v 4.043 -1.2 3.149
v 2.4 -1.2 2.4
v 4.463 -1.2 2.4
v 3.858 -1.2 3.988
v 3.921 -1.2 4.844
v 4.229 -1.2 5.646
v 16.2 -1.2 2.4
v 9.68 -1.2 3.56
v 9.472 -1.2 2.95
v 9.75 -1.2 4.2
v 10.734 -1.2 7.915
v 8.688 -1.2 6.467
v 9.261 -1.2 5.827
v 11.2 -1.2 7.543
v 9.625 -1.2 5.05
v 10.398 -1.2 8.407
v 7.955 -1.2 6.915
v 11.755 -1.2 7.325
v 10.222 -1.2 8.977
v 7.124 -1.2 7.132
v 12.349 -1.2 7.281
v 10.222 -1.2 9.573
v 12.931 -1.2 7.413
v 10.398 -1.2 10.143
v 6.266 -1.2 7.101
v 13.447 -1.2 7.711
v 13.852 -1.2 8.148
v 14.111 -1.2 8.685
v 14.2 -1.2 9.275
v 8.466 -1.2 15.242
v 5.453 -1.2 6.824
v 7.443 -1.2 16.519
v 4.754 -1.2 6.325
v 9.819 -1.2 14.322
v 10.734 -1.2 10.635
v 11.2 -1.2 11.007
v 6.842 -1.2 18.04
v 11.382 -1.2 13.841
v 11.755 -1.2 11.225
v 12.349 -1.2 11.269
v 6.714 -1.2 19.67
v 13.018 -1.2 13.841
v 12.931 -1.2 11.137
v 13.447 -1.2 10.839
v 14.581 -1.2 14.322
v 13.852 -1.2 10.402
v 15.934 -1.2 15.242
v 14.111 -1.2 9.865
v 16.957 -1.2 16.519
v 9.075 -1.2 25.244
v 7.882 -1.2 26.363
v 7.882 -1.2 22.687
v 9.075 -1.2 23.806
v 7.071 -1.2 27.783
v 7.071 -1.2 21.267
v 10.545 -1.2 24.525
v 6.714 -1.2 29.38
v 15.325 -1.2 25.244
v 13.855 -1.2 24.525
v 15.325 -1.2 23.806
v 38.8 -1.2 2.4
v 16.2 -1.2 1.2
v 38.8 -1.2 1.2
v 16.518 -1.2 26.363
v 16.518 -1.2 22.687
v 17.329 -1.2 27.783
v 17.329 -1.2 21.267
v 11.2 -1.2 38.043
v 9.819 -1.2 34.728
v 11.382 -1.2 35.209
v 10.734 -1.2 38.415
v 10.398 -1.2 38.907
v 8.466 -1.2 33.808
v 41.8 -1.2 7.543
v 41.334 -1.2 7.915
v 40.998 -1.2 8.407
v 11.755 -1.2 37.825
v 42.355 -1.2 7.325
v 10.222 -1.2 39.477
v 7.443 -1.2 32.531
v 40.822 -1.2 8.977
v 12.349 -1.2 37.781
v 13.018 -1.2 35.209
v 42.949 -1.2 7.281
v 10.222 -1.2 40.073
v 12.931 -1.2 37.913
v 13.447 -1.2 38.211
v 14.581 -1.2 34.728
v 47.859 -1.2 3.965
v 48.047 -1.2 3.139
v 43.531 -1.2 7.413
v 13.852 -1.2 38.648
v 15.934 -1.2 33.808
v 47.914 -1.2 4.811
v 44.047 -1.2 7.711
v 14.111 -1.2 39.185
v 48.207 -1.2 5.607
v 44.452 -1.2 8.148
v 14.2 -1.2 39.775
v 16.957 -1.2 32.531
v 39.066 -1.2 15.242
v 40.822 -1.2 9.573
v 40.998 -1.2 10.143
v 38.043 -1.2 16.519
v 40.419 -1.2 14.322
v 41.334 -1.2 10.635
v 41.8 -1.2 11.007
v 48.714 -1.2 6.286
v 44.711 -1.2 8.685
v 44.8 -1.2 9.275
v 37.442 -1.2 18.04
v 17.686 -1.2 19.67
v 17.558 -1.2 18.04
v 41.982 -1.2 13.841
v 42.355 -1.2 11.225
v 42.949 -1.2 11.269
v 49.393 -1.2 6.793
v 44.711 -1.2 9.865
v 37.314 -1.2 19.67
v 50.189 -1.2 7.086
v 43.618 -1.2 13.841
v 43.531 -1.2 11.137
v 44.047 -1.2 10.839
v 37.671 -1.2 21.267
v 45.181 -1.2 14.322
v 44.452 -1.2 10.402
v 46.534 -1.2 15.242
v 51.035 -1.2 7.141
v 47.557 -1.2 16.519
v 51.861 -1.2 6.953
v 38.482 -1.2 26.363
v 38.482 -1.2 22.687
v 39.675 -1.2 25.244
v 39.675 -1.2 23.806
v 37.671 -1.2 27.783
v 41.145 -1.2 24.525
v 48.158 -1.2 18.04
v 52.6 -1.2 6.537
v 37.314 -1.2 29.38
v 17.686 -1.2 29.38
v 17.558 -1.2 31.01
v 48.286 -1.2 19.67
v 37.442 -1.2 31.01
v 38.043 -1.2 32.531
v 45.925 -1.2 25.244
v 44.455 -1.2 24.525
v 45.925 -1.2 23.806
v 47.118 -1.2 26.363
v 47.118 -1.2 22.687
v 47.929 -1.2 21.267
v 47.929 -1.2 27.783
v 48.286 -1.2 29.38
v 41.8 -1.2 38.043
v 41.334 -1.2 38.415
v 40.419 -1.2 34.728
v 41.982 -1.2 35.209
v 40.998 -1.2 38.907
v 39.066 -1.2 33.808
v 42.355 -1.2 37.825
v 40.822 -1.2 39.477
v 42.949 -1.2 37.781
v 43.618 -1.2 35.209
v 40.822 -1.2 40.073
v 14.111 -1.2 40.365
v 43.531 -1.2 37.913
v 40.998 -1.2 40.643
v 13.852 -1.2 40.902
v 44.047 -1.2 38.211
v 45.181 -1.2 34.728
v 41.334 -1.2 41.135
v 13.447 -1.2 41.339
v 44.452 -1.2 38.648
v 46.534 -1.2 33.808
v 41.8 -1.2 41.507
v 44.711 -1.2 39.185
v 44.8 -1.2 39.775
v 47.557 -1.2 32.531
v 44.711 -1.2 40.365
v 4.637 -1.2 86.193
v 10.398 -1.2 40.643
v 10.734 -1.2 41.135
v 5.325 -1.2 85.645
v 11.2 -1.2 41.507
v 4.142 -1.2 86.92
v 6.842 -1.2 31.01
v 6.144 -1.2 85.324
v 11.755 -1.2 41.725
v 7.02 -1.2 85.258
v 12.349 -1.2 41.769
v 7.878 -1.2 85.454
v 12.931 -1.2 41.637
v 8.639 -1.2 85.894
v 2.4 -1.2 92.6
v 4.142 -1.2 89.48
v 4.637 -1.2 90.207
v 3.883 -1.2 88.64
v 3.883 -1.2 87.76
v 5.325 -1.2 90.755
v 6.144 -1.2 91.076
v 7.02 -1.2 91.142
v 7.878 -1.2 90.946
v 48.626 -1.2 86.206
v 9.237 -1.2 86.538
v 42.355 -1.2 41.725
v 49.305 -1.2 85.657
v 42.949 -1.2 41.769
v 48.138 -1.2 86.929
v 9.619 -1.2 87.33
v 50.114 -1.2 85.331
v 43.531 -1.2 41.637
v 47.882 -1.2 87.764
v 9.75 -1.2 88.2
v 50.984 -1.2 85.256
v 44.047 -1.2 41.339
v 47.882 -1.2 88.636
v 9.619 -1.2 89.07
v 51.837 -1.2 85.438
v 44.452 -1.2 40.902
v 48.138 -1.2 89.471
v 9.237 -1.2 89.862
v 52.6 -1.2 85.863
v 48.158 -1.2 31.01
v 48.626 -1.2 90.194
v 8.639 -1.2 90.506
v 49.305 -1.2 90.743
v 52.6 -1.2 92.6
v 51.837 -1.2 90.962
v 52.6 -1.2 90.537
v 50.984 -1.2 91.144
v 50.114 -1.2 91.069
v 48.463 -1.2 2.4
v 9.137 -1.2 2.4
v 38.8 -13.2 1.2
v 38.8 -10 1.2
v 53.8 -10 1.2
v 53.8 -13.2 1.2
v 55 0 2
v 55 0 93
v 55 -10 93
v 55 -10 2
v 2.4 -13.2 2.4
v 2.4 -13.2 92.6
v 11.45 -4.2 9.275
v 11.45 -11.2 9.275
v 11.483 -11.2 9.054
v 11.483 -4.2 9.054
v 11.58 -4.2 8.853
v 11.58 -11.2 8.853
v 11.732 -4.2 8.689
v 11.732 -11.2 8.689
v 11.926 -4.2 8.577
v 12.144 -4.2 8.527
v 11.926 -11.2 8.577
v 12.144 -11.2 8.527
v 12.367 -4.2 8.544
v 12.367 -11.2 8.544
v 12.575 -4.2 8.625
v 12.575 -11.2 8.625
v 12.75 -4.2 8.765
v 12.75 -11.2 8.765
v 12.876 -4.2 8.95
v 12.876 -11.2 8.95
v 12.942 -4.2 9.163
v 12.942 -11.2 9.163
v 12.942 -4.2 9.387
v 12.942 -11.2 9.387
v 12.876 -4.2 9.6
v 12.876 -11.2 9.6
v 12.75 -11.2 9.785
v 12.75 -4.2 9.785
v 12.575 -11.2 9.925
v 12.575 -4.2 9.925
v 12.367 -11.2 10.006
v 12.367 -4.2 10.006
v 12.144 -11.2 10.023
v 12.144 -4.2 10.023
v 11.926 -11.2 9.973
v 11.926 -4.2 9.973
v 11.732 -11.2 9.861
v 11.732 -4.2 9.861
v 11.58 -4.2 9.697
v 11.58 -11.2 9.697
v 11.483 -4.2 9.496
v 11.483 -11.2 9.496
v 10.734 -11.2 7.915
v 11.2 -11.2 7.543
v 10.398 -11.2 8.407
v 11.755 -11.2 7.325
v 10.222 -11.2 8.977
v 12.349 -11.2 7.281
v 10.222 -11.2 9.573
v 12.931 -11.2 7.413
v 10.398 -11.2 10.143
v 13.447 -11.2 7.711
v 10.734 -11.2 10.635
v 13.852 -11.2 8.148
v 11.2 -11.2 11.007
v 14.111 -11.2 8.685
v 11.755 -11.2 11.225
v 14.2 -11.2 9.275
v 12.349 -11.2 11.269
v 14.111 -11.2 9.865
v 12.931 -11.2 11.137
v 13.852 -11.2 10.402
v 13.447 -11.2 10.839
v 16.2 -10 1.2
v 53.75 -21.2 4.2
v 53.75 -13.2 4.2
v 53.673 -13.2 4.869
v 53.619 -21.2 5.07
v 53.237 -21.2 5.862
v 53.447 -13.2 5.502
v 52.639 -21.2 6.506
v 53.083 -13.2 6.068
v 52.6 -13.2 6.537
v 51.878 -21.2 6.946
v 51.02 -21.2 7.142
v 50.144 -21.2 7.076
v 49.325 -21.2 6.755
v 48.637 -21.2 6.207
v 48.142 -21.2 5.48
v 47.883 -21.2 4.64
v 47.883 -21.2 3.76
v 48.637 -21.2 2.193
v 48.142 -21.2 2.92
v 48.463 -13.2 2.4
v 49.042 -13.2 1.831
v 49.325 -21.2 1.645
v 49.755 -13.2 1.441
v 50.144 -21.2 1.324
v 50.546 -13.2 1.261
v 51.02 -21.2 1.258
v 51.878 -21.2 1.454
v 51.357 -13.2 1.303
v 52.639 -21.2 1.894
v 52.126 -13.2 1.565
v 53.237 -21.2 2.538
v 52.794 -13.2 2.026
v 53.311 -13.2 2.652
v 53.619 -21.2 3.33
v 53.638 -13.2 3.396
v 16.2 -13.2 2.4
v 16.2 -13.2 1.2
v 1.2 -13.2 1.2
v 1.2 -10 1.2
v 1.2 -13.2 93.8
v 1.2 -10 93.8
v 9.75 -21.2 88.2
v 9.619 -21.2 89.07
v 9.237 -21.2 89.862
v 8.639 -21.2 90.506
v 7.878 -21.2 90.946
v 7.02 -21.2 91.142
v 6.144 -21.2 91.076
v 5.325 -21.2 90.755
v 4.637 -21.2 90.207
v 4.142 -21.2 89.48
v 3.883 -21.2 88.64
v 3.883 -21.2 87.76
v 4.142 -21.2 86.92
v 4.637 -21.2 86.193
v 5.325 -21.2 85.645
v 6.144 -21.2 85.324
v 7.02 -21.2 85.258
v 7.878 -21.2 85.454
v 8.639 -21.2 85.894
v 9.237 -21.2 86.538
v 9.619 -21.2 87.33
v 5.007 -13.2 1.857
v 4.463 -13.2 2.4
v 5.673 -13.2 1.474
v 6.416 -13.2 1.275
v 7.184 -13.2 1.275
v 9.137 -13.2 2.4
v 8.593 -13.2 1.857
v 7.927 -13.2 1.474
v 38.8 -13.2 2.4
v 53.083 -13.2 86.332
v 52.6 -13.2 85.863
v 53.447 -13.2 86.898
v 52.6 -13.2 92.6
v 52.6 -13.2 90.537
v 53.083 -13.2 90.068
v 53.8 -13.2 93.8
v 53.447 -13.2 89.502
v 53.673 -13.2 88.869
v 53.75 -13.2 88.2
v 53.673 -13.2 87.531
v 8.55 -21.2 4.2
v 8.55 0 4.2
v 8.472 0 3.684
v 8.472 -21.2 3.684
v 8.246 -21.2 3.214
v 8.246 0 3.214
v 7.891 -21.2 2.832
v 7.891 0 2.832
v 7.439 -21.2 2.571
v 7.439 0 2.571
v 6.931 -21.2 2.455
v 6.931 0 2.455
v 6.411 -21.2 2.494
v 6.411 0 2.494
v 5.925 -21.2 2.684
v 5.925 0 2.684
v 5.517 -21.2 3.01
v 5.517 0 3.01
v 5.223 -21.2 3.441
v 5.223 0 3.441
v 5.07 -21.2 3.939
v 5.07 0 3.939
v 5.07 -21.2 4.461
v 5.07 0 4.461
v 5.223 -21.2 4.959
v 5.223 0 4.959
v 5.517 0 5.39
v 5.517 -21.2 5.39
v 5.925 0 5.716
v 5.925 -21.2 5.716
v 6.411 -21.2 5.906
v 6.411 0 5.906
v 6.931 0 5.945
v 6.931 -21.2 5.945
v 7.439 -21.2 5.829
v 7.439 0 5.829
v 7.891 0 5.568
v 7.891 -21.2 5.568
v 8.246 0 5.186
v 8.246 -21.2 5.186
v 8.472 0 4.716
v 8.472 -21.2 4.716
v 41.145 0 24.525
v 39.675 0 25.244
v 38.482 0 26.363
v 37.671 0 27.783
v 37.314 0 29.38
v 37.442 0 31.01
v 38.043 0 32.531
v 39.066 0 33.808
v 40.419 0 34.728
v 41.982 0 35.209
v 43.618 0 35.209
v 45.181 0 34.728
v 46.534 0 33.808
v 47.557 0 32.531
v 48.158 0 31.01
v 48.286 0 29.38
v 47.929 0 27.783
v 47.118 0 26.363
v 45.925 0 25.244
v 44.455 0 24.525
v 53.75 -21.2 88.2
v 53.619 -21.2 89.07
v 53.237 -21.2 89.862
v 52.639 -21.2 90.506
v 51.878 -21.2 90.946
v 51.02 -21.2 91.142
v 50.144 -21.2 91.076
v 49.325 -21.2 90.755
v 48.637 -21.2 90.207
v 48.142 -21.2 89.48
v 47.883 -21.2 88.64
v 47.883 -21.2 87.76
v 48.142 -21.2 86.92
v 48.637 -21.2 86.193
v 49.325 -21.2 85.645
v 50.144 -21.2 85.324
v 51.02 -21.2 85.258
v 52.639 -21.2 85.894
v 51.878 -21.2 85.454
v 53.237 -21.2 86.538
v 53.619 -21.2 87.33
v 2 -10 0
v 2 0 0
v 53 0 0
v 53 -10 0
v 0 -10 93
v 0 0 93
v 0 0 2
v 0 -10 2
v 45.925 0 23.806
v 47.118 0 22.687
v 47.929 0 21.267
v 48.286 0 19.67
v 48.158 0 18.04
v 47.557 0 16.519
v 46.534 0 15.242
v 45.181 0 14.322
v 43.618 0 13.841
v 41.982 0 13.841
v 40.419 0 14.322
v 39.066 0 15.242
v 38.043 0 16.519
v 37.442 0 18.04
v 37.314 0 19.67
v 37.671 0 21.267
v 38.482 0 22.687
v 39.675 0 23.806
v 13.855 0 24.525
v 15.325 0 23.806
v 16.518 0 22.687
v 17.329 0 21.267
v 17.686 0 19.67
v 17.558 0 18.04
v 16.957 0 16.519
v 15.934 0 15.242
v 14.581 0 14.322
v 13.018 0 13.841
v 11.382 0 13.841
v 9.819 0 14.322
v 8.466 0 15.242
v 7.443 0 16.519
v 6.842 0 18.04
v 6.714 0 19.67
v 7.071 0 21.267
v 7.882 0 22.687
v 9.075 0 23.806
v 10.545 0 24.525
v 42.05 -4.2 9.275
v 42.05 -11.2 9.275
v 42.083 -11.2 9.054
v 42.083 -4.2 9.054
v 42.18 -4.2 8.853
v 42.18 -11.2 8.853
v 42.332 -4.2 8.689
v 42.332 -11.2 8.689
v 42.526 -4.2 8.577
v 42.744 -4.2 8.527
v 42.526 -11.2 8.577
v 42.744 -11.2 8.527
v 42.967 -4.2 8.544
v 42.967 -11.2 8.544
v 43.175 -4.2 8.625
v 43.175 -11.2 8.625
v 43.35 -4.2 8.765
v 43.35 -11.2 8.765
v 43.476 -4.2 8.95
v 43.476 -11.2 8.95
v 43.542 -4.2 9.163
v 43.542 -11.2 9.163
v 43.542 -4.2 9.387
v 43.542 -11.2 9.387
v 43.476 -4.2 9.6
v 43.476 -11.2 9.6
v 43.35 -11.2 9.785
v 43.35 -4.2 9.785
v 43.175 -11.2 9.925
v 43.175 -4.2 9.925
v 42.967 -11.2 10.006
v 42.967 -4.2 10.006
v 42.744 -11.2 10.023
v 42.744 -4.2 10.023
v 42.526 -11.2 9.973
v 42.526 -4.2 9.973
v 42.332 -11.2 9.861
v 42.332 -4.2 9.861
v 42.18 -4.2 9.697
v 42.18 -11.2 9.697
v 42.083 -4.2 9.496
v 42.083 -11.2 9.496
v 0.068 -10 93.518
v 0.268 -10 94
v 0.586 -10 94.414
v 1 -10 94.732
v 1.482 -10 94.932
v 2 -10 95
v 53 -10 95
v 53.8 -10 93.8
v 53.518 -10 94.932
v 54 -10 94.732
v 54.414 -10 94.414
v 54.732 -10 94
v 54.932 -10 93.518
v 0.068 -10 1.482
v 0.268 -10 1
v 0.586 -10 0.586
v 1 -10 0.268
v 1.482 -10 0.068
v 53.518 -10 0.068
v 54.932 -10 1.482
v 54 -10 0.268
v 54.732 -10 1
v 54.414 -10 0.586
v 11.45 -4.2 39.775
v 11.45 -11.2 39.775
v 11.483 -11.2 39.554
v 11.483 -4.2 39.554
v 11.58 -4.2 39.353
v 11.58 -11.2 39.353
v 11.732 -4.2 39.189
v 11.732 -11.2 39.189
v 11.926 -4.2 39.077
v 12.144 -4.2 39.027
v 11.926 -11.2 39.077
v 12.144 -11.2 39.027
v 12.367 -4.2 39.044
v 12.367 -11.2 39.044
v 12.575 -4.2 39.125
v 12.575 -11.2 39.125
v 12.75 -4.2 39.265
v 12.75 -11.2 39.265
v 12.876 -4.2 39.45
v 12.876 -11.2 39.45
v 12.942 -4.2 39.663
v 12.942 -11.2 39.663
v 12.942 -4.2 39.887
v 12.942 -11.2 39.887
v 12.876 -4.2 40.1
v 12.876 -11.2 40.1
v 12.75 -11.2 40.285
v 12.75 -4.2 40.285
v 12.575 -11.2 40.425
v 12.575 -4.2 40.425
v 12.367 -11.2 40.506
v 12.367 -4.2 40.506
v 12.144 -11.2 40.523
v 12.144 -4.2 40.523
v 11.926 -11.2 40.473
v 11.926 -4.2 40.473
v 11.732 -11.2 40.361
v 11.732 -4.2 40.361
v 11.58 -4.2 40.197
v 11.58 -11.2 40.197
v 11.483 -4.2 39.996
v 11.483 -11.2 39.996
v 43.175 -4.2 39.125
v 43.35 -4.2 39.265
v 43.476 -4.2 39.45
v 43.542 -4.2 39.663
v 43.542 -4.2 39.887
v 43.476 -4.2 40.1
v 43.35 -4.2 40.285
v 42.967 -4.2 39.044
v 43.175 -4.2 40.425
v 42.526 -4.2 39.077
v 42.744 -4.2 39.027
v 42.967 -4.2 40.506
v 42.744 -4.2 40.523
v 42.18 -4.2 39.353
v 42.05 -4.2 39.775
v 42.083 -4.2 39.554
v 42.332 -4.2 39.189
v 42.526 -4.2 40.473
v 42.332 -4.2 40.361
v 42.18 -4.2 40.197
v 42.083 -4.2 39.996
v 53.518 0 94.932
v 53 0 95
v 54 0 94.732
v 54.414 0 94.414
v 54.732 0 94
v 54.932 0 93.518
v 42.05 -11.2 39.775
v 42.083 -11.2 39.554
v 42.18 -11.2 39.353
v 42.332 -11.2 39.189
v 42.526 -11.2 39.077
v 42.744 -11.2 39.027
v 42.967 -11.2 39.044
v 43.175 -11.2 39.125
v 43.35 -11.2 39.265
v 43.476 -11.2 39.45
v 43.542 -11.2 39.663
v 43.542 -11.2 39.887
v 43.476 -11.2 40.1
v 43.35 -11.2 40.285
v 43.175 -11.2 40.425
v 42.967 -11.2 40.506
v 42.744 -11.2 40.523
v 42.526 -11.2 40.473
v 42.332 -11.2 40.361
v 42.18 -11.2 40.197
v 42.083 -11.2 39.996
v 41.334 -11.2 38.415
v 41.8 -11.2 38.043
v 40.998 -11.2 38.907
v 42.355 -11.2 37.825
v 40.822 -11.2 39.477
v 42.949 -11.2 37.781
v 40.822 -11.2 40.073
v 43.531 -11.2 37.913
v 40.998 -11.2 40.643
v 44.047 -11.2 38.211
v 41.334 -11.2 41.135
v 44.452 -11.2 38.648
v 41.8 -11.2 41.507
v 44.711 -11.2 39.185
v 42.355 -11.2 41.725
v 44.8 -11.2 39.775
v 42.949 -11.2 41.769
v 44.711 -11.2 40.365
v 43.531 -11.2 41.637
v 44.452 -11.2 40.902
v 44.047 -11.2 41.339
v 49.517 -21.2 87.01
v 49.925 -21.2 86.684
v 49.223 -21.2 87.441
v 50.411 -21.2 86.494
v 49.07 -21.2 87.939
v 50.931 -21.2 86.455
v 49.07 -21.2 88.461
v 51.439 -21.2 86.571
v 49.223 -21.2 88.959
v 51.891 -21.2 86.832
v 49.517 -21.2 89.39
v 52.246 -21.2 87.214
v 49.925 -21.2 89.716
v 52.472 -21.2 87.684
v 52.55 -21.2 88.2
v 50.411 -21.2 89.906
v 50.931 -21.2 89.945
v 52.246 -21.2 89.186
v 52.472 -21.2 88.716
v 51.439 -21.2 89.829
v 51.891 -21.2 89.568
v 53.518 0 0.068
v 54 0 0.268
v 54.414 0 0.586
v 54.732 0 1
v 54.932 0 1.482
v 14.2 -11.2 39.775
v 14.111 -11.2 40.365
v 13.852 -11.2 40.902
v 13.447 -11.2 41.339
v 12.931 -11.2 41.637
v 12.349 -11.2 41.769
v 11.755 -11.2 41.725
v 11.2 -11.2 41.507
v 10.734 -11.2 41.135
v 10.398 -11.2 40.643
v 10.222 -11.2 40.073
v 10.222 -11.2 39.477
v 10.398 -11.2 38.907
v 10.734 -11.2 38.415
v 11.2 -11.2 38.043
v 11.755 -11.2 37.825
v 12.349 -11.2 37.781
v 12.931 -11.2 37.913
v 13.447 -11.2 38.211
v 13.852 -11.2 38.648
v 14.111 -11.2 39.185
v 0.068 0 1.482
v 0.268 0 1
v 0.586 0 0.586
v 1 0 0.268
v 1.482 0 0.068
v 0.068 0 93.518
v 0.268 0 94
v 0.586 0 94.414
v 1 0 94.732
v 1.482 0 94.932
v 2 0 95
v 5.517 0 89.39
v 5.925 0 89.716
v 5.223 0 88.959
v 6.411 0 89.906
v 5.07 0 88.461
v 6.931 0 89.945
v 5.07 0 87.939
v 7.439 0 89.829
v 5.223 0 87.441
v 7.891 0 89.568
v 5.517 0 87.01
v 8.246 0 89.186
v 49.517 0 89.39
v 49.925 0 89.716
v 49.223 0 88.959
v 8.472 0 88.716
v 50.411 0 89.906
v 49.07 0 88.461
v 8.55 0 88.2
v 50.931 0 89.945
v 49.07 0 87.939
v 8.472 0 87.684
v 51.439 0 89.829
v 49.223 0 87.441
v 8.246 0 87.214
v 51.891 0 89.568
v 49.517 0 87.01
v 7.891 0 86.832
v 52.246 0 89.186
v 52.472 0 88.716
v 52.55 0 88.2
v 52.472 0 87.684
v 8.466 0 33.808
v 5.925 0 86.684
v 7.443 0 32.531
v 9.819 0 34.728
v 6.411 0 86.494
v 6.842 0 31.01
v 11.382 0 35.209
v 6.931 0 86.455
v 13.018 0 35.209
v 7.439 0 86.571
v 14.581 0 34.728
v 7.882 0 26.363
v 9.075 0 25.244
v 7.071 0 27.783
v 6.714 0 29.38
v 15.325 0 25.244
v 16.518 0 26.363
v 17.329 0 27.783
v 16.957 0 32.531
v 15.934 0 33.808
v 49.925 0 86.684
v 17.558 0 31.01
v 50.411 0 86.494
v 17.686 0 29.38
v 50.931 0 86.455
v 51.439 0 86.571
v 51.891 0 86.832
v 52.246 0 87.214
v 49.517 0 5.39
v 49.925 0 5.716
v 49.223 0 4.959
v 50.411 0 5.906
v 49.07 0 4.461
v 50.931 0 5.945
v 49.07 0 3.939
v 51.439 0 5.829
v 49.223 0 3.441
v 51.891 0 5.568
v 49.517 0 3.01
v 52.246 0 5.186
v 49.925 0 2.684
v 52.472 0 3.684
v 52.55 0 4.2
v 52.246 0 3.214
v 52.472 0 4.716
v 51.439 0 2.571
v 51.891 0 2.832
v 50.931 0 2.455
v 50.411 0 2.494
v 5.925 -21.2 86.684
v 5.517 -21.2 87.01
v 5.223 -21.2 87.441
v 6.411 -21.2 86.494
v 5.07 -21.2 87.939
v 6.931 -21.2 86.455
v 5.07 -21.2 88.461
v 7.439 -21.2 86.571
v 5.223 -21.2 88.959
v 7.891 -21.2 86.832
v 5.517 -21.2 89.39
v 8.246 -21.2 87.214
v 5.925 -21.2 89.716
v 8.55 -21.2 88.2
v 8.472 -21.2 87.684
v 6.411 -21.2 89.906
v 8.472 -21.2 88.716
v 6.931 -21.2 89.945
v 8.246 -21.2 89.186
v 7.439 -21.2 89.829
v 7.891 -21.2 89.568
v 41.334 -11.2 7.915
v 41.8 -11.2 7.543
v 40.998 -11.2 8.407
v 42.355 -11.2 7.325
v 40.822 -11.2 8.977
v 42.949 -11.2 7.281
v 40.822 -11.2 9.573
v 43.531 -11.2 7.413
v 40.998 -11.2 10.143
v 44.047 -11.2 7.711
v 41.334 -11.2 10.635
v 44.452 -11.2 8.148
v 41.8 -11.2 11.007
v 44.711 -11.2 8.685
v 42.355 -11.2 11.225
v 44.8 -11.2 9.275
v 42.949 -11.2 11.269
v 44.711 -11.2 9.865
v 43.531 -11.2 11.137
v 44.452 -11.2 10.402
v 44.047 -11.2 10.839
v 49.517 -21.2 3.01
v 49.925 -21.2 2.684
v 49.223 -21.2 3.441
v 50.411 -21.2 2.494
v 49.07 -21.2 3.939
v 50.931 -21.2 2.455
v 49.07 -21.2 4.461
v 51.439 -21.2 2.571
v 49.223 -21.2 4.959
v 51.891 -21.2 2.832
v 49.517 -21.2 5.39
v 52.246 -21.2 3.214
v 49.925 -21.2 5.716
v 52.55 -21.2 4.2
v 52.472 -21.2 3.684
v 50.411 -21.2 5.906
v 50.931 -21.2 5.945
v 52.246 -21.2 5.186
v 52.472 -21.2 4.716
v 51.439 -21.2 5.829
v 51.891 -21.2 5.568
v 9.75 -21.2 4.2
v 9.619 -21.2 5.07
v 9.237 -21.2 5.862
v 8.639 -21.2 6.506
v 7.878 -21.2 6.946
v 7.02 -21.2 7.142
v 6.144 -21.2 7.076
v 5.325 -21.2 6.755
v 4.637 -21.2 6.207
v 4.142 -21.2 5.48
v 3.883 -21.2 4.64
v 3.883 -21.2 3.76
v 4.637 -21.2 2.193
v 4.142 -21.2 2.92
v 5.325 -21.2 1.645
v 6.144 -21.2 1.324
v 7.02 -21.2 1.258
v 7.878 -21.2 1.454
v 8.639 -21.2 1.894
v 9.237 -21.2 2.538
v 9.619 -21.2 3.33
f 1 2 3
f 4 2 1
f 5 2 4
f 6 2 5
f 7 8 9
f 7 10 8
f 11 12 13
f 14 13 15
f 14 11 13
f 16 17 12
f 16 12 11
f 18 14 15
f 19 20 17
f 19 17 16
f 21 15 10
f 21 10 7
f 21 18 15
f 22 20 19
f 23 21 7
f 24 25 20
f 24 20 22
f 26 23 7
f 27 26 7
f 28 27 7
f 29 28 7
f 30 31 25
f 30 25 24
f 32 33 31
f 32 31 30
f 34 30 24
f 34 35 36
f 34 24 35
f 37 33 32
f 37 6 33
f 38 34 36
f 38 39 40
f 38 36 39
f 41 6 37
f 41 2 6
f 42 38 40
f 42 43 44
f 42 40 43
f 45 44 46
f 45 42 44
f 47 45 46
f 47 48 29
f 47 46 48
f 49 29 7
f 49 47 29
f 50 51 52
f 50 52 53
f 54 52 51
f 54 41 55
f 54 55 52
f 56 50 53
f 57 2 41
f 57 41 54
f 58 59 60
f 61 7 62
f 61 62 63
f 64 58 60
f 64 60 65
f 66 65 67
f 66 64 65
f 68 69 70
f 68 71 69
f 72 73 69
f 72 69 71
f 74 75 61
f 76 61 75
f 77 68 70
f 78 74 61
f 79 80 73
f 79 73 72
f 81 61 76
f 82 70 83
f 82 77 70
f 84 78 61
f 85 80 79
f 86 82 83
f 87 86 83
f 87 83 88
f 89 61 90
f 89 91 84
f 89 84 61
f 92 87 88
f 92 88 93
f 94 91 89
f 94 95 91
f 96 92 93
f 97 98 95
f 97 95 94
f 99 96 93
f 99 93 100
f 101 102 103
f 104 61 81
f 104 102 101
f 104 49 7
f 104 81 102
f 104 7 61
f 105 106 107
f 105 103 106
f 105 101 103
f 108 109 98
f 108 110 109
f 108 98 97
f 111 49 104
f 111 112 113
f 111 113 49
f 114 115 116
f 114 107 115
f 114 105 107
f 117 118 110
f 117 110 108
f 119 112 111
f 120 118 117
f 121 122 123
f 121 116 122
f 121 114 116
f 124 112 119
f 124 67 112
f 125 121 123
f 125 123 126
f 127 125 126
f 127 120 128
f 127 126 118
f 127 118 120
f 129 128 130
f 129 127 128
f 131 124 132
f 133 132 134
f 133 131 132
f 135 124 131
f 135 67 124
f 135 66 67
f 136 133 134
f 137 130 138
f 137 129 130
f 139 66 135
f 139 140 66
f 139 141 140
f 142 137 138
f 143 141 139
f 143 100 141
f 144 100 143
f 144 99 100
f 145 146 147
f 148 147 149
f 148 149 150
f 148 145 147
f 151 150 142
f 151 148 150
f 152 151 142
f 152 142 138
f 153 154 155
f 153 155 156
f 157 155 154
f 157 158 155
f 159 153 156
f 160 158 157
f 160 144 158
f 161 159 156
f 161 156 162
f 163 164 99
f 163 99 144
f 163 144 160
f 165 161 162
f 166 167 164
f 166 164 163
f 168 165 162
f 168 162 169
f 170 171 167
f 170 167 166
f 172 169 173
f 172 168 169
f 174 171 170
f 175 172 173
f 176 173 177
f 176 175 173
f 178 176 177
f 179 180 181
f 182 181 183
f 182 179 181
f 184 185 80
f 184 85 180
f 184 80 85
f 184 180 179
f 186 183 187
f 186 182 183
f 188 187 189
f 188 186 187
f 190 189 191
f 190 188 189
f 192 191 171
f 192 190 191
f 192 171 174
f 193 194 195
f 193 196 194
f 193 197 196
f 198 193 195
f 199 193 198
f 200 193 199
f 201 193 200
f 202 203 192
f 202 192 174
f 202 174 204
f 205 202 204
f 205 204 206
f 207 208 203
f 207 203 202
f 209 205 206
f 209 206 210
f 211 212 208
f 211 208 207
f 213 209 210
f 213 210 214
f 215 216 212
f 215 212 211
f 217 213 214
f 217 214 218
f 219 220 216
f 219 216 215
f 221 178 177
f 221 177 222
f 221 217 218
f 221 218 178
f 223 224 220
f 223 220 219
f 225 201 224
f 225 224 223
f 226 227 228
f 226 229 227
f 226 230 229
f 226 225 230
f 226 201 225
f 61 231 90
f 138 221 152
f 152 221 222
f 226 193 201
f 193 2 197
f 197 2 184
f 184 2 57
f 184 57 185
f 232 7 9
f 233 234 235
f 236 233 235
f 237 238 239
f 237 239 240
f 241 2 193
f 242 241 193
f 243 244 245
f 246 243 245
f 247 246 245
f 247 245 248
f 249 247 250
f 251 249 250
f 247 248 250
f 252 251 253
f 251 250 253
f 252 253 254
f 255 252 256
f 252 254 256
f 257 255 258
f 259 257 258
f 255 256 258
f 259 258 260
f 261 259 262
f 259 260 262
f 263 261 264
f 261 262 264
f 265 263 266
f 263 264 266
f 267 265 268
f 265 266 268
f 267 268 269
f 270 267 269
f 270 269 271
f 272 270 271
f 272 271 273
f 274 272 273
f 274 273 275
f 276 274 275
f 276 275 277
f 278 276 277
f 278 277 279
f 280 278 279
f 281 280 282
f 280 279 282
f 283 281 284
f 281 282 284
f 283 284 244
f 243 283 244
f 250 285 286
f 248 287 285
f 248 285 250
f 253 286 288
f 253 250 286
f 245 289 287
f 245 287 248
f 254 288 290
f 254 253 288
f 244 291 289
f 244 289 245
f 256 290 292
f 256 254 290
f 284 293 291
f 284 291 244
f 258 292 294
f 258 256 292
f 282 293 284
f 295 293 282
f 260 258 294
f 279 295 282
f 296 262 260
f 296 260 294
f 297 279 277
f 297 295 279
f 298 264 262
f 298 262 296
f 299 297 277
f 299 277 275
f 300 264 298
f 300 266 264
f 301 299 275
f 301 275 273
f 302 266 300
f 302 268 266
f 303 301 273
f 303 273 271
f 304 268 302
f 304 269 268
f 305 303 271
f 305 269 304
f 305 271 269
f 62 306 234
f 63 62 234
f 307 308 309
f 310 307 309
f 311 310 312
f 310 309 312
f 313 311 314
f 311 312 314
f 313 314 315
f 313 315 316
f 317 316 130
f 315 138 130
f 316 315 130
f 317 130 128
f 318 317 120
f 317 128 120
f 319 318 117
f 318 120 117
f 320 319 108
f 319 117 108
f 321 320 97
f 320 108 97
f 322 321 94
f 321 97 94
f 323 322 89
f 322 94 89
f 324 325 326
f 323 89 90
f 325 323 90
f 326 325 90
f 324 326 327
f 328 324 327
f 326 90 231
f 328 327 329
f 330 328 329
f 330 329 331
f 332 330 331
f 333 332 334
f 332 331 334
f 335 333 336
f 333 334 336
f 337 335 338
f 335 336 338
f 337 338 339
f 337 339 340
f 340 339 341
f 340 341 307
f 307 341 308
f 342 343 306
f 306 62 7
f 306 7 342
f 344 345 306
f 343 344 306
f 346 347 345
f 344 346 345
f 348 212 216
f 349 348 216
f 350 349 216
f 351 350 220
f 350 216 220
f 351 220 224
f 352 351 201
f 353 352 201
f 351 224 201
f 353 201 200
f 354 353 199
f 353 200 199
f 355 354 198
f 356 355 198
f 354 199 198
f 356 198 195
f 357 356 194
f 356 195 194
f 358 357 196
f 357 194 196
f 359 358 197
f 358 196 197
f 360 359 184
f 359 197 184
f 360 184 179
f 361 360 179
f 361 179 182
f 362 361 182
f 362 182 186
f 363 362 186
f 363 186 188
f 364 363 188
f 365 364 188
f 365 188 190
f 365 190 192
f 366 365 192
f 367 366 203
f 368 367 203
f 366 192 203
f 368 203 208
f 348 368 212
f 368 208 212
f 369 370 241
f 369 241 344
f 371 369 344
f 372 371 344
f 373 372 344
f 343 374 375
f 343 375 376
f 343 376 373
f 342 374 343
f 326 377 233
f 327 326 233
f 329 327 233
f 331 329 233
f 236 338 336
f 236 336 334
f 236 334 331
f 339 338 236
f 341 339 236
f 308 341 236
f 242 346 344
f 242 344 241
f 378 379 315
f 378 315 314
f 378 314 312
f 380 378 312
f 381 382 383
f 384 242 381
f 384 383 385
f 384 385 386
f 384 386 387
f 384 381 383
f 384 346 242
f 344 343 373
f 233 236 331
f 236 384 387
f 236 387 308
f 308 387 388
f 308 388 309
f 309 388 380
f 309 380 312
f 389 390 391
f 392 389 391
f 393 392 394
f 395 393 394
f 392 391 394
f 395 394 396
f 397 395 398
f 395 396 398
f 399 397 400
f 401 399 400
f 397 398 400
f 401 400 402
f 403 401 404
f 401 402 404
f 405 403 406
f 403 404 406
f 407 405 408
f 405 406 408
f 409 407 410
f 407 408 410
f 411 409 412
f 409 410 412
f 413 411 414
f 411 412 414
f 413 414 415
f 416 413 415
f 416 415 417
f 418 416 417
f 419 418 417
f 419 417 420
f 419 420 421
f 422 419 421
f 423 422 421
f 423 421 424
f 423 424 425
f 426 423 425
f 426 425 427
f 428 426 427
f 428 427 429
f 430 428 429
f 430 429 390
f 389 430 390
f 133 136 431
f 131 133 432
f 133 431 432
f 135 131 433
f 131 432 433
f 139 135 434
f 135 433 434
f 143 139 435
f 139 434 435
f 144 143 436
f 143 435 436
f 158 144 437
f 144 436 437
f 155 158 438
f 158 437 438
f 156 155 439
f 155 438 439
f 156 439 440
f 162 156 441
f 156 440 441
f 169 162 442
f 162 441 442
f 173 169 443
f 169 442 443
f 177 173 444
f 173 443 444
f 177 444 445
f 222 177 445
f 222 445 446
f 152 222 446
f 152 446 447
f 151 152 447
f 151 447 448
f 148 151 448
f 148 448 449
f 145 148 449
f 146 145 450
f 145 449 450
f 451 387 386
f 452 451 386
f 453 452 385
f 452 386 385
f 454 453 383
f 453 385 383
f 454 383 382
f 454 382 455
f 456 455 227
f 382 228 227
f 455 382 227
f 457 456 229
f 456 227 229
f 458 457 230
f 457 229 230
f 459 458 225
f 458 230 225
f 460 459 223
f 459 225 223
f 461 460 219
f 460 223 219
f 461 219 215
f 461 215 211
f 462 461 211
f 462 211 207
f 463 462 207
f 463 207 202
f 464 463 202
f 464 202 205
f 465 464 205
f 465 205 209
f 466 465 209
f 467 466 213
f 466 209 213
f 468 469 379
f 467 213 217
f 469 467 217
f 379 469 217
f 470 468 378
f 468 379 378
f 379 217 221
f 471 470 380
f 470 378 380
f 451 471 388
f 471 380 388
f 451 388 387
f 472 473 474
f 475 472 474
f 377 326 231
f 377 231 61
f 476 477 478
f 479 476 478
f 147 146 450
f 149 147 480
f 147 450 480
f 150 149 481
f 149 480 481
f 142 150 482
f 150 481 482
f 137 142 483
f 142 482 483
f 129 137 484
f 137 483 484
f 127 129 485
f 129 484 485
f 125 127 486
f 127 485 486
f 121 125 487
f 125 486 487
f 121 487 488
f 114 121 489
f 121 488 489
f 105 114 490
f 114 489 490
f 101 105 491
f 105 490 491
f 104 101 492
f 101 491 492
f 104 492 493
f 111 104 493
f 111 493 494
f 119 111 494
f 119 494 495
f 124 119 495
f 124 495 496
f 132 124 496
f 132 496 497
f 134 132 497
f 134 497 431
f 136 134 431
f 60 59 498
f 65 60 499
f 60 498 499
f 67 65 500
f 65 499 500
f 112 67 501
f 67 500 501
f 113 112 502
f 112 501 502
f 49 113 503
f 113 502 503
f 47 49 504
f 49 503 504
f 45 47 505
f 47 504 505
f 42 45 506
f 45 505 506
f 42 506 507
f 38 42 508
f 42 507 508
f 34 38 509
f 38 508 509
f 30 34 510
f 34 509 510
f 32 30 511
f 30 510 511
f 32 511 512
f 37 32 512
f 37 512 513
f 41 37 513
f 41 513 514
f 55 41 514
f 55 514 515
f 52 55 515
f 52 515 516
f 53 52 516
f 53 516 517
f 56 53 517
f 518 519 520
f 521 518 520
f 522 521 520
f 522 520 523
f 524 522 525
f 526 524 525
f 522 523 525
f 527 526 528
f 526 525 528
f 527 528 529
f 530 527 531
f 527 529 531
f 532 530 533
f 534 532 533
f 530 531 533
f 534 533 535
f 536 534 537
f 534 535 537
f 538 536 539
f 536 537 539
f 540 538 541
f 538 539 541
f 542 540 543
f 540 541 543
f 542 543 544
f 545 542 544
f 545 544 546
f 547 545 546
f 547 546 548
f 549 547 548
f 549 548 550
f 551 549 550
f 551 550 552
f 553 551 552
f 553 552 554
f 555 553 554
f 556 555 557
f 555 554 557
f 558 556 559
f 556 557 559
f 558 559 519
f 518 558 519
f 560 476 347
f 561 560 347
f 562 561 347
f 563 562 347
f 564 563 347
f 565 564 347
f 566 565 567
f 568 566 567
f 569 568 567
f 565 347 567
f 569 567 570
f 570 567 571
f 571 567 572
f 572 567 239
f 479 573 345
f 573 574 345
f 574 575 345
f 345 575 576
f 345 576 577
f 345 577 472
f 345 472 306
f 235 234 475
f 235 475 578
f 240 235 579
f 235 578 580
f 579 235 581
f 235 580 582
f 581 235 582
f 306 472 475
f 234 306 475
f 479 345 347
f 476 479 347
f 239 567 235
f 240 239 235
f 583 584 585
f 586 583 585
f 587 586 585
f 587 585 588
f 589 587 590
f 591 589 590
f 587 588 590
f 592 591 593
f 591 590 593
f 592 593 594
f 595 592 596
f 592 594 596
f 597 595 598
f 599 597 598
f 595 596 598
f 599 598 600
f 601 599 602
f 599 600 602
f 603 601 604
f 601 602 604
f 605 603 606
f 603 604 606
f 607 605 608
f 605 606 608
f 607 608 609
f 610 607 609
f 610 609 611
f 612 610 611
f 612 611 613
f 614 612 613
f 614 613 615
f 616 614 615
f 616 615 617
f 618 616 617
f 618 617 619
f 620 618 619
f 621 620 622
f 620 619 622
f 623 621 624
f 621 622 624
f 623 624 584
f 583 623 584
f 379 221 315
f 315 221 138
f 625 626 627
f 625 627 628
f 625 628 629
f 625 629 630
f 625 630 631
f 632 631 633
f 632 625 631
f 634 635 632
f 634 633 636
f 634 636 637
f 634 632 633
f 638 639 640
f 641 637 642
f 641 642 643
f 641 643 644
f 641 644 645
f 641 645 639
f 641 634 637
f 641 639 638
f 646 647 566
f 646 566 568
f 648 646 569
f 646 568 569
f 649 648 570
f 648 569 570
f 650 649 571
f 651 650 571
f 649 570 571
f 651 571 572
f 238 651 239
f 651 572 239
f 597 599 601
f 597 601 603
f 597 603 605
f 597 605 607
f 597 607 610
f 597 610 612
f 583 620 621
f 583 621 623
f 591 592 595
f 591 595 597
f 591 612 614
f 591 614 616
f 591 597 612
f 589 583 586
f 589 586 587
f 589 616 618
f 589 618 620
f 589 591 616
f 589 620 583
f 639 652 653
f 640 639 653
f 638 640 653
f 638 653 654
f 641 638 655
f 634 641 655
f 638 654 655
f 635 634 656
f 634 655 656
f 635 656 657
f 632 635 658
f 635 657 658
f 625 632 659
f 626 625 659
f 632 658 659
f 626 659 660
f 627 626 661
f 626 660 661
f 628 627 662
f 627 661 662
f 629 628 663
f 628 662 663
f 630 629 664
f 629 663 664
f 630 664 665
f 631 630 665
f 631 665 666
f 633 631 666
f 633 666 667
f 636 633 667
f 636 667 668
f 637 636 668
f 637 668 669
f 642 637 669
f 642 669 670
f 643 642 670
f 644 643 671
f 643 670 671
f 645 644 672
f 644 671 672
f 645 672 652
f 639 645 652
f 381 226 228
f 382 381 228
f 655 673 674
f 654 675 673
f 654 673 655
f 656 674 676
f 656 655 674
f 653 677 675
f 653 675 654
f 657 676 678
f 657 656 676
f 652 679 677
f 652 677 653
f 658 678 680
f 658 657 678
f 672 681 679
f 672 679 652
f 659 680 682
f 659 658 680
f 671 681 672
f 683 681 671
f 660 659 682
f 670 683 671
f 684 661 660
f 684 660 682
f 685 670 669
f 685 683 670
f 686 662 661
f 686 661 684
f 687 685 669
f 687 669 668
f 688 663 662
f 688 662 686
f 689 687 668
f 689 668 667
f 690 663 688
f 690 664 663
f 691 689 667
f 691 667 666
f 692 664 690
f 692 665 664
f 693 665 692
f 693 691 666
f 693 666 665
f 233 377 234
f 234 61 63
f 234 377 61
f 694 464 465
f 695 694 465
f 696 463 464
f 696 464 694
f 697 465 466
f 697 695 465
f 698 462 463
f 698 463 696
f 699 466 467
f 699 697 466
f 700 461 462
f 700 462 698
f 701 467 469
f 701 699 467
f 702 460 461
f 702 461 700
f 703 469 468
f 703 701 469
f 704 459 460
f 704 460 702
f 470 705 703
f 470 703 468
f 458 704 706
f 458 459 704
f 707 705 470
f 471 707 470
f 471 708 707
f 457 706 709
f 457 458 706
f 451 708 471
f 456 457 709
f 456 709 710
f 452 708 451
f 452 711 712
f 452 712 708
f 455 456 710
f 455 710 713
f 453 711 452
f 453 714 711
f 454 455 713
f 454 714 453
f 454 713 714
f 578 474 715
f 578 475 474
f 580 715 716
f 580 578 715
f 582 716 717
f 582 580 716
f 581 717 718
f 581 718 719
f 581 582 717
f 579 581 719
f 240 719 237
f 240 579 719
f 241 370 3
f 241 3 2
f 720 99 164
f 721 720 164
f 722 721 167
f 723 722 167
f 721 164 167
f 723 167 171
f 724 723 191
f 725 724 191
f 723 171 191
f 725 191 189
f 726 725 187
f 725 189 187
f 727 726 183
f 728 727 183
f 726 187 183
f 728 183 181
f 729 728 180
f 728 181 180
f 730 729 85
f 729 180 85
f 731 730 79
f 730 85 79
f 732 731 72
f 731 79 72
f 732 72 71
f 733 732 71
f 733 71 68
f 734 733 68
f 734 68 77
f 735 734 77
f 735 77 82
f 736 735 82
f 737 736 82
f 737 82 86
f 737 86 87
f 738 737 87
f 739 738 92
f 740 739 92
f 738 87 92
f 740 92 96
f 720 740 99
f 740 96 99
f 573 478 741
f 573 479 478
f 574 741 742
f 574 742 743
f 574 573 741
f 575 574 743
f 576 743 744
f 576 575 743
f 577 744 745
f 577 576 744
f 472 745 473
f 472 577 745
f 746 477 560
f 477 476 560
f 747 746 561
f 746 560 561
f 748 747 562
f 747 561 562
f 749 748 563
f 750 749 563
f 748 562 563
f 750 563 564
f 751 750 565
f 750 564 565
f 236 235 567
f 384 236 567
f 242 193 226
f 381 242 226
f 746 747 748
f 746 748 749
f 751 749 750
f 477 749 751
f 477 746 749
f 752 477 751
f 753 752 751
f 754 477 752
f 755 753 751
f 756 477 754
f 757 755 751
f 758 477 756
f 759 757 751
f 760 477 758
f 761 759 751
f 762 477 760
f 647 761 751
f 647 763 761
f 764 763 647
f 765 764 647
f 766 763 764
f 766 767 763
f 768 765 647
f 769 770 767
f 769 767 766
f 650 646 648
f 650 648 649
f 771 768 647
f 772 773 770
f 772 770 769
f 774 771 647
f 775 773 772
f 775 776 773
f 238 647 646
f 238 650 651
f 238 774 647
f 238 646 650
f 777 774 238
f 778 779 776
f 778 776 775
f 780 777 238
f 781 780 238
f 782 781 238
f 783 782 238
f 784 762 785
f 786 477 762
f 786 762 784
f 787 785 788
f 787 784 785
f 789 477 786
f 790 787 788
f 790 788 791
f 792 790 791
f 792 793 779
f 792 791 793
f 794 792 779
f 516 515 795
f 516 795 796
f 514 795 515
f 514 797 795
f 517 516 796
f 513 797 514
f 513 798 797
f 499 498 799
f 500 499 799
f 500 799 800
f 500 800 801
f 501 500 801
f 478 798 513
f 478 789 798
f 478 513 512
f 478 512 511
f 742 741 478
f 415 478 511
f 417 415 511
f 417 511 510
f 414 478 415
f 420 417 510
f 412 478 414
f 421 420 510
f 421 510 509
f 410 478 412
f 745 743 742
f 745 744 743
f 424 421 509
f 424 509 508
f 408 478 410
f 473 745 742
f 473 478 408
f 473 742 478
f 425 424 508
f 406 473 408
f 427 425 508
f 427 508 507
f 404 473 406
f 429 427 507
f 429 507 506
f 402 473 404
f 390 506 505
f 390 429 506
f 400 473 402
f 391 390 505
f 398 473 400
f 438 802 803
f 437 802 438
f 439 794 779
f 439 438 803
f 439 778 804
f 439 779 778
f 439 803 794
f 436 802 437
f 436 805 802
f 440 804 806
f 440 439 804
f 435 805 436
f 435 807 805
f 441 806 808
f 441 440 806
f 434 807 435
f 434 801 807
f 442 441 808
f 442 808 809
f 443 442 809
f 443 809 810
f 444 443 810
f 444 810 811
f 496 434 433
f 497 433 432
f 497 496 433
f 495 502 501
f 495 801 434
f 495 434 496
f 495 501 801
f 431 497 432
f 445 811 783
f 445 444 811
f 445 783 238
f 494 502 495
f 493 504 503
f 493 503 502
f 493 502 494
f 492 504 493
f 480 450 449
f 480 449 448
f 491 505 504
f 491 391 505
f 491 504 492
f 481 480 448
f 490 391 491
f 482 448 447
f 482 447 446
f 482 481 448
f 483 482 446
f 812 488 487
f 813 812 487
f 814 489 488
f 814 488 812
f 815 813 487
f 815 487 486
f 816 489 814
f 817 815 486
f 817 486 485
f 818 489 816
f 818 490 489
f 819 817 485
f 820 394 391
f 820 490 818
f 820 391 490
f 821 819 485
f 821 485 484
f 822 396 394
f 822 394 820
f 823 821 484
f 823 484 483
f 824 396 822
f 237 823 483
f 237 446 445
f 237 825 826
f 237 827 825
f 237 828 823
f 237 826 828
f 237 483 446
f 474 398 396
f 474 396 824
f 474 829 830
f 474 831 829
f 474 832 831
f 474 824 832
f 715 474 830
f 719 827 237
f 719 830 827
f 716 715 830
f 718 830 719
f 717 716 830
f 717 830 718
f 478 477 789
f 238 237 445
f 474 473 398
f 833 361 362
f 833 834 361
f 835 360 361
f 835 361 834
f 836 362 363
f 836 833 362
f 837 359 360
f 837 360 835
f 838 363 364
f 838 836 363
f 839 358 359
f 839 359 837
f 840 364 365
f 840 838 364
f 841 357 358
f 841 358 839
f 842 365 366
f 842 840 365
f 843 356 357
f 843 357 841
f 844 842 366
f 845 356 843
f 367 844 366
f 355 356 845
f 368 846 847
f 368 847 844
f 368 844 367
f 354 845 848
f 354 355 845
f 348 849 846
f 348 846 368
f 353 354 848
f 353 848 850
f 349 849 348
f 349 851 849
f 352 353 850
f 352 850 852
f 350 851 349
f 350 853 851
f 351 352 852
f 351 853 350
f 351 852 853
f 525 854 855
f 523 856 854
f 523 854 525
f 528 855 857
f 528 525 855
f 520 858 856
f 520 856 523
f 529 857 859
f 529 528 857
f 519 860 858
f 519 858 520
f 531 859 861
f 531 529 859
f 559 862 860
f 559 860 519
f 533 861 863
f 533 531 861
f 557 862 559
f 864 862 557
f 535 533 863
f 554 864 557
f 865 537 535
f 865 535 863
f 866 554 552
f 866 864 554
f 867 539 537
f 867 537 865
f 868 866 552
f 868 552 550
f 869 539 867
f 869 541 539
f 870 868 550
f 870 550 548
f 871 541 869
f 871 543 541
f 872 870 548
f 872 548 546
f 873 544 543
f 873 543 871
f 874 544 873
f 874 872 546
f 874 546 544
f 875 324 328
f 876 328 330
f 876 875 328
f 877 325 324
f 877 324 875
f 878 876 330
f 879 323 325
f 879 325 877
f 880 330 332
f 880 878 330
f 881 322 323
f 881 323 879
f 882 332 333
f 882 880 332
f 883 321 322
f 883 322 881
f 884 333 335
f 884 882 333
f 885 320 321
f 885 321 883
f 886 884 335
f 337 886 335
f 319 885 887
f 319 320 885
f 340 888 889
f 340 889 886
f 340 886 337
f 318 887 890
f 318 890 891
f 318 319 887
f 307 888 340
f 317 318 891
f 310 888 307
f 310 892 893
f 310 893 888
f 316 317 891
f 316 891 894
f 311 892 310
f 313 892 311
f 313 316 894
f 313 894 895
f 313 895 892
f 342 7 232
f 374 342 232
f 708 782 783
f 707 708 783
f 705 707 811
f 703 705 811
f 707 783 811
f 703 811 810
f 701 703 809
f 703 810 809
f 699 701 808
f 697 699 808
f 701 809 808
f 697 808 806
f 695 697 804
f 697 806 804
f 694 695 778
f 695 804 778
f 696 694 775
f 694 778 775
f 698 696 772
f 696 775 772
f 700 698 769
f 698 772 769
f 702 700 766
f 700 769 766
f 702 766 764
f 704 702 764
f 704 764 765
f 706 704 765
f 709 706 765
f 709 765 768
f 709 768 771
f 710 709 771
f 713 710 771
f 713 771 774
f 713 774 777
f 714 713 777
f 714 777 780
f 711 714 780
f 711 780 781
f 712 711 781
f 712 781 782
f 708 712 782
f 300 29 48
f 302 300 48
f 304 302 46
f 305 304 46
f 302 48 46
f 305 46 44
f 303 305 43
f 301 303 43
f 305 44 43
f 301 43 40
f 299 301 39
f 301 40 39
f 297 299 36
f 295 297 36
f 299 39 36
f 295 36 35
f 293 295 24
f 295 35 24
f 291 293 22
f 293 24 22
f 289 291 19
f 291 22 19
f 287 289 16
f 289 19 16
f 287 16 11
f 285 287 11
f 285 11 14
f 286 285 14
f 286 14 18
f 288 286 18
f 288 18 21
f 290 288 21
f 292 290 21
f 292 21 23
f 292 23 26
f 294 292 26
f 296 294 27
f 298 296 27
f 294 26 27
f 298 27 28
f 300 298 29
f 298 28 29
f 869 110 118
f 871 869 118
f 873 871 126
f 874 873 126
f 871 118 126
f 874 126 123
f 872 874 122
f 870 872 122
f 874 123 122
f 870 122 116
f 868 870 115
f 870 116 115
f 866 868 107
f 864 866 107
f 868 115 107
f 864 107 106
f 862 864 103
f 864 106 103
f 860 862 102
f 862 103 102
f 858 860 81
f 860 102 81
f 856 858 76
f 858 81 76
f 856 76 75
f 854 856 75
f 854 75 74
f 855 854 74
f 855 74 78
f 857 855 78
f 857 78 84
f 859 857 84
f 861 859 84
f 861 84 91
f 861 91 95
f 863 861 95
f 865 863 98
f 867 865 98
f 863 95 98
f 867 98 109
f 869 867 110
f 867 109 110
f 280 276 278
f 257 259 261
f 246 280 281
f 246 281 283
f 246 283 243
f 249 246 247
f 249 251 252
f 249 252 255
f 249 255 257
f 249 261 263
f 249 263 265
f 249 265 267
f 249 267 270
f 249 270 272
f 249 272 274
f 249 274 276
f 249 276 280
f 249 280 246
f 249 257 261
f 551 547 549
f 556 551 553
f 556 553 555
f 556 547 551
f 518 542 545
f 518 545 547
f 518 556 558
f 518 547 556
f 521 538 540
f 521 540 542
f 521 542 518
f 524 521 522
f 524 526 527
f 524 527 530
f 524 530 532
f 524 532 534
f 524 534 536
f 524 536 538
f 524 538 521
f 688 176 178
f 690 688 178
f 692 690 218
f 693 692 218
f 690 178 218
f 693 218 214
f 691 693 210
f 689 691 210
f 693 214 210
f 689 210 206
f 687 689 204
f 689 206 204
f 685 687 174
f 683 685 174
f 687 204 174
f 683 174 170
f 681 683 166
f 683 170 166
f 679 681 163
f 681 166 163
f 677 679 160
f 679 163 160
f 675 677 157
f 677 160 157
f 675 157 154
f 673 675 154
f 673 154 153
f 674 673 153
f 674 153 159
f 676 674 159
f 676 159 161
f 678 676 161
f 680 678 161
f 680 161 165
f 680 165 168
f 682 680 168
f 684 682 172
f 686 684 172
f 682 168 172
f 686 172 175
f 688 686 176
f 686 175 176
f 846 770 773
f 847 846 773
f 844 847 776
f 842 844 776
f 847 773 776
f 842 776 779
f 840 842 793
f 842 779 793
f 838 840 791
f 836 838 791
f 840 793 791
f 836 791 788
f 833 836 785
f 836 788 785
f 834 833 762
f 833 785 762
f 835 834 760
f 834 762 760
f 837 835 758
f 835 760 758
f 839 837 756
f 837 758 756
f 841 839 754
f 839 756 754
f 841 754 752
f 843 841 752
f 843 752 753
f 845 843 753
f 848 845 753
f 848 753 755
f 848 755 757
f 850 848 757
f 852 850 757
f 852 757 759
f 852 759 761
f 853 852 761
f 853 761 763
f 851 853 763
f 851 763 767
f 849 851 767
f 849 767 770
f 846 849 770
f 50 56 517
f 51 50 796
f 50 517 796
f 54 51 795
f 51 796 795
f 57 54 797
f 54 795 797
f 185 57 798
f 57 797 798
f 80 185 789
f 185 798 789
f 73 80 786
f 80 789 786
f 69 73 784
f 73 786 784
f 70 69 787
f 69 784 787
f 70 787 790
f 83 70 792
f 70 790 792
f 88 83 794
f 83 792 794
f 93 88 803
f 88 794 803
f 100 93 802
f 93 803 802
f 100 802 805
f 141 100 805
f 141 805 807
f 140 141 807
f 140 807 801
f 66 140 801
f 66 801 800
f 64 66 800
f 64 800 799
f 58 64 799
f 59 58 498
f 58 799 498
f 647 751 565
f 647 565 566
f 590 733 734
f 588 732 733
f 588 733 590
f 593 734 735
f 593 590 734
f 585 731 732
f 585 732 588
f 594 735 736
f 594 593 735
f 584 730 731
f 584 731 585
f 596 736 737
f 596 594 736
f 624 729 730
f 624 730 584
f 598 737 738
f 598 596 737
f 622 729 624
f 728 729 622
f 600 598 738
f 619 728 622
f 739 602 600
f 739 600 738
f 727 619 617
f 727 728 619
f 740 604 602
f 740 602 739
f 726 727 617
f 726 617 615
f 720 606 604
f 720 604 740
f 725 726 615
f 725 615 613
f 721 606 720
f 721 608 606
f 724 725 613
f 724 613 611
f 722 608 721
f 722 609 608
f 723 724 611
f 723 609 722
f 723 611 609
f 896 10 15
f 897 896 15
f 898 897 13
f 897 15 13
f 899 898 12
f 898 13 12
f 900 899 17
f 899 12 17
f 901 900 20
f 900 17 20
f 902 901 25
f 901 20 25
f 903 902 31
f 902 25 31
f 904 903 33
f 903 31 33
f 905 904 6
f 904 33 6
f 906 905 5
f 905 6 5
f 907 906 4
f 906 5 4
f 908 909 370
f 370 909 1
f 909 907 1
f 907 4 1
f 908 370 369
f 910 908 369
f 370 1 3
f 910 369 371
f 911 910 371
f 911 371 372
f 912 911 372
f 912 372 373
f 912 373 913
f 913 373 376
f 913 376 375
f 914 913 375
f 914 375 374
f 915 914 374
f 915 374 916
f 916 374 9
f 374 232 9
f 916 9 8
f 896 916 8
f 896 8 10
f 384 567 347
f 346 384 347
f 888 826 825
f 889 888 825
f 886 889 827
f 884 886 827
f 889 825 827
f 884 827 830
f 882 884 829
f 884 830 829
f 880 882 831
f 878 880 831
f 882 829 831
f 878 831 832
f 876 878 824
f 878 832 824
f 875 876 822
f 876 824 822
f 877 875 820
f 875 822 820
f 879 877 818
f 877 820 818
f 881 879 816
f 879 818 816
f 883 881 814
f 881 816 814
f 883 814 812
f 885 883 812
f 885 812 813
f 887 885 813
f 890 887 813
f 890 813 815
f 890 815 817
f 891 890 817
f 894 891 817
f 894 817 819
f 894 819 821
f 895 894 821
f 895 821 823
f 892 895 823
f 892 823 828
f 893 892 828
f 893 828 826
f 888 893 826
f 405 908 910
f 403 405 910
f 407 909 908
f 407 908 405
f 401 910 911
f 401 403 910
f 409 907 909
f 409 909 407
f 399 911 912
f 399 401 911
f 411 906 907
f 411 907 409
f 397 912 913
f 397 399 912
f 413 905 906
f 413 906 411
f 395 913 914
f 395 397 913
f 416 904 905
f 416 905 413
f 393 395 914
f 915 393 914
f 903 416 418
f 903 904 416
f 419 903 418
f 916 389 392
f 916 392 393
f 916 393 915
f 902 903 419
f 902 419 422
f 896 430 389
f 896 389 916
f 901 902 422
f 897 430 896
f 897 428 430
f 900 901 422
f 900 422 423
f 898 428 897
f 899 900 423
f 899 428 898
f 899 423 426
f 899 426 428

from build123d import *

# Parameters (mm, degrees)
SKETCH1_W           = 55
SKETCH1_H           = 95
BOSS_EXTRUDE1_DEPTH = 10
SKETCH3_W           = 52.6
SKETCH3_H           = 92.6
CUT_EXTRUDE1_DEPTH  = 8.8
FILLET1_R           = 2
CUT_EXTRUDE2_REACH  = 12
SKETCH4_R           = 5.5
CUT_EXTRUDE3_REACH  = 12
SKETCH5_R           = 5.5
SKETCH7_R           = 2.95
BOSS_EXTRUDE4_DEPTH = 20
CUT_EXTRUDE4_REACH  = 23.2
SKETCH8_R           = 1.75
BOSS_EXTRUDE5_DEPTH = 12
SKETCH11_R          = 2
BOSS_EXTRUDE6_DEPTH = 10
SKETCH12_R          = 0.75
CUT_EXTRUDE5_DEPTH  = 7


with BuildPart() as part:
    # Sketch1 → Boss-Extrude1 (new body)
    with BuildSketch(Plane(origin=(0, 0, 0), x_dir=(1, 0, 0), z_dir=(0, 1, 0))):
        with Locations((27.5, -47.5)):
            Rectangle(SKETCH1_W, SKETCH1_H)
    extrude(amount=-BOSS_EXTRUDE1_DEPTH)

    # Sketch3 → Cut-Extrude1 (cut)
    with BuildSketch(Plane.XZ.offset(10)):
        with Locations((27.5, 47.5)):
            Rectangle(SKETCH3_W, SKETCH3_H)
    extrude(amount=-CUT_EXTRUDE1_DEPTH, mode=Mode.SUBTRACT)

    # Fillet1
    fillet1_edges = [part.edges().sort_by_distance(p)[0] for p in [
        (0, -5, 0),
        (0, -5, 95),
        (55, -5, 95),
        (55, -5, 0),
    ]]
    fillet(fillet1_edges, radius=FILLET1_R)

    # Sketch4 → Cut-Extrude2 (cut, up to next)
    with BuildSketch(Plane(origin=(0, 0, 0), x_dir=(1, 0, 0), z_dir=(0, 1, 0)), mode=Mode.PRIVATE) as cut_extrude2_sk1:
        with Locations((42.8, -29.77)):
            Circle(SKETCH4_R)
    cut_extrude2_tool1 = extrude(cut_extrude2_sk1.sketch, amount=-CUT_EXTRUDE2_REACH, mode=Mode.PRIVATE) & part.part
    add(cut_extrude2_tool1.solids().sort_by_distance((42.8, 0, 29.77))[0], mode=Mode.SUBTRACT)
    # Sketch4 → Cut-Extrude2 (cut, up to next)
    with BuildSketch(Plane(origin=(0, 0, 0), x_dir=(1, 0, 0), z_dir=(0, 1, 0)), mode=Mode.PRIVATE) as cut_extrude2_sk2:
        with Locations((42.8, -19.28)):
            Circle(SKETCH4_R)
    cut_extrude2_tool2 = extrude(cut_extrude2_sk2.sketch, amount=-CUT_EXTRUDE2_REACH, mode=Mode.PRIVATE) & part.part
    add(cut_extrude2_tool2.solids().sort_by_distance((42.8, 0, 19.28))[0], mode=Mode.SUBTRACT)

    # Sketch5 → Cut-Extrude3 (cut, up to next)
    with BuildSketch(Plane(origin=(0, 0, 0), x_dir=(1, 0, 0), z_dir=(0, 1, 0)), mode=Mode.PRIVATE) as cut_extrude3_sk1:
        with Locations((12.2, -29.77)):
            Circle(SKETCH5_R)
    cut_extrude3_tool1 = extrude(cut_extrude3_sk1.sketch, amount=-CUT_EXTRUDE3_REACH, mode=Mode.PRIVATE) & part.part
    add(cut_extrude3_tool1.solids().sort_by_distance((12.2, 0, 29.77))[0], mode=Mode.SUBTRACT)
    # Sketch5 → Cut-Extrude3 (cut, up to next)
    with BuildSketch(Plane(origin=(0, 0, 0), x_dir=(1, 0, 0), z_dir=(0, 1, 0)), mode=Mode.PRIVATE) as cut_extrude3_sk2:
        with Locations((12.2, -19.28)):
            Circle(SKETCH5_R)
    cut_extrude3_tool2 = extrude(cut_extrude3_sk2.sketch, amount=-CUT_EXTRUDE3_REACH, mode=Mode.PRIVATE) & part.part
    add(cut_extrude3_tool2.solids().sort_by_distance((12.2, 0, 19.28))[0], mode=Mode.SUBTRACT)

    # Sketch7 → Boss-Extrude4 (add)
    with BuildSketch(Plane.XZ.offset(1.2)):
        with Locations((50.8, 88.2)):
            Circle(SKETCH7_R)
        with Locations((6.8, 88.2)):
            Circle(SKETCH7_R)
        with Locations((6.8, 4.2)):
            Circle(SKETCH7_R)
        with Locations((50.8, 4.2)):
            Circle(SKETCH7_R)
    extrude(amount=BOSS_EXTRUDE4_DEPTH)

    # Sketch8 → Cut-Extrude4 (cut, up to next)
    with BuildSketch(Plane(origin=(0, 0, 0), x_dir=(1, 0, 0), z_dir=(0, 1, 0)), mode=Mode.PRIVATE) as cut_extrude4_sk1:
        with Locations((6.8, -88.2)):
            Circle(SKETCH8_R)
    cut_extrude4_tool1 = extrude(cut_extrude4_sk1.sketch, amount=-CUT_EXTRUDE4_REACH, mode=Mode.PRIVATE) & part.part
    add(cut_extrude4_tool1.solids().sort_by_distance((6.8, 0, 88.2))[0], mode=Mode.SUBTRACT)
    # Sketch8 → Cut-Extrude4 (cut, up to next)
    with BuildSketch(Plane(origin=(0, 0, 0), x_dir=(1, 0, 0), z_dir=(0, 1, 0)), mode=Mode.PRIVATE) as cut_extrude4_sk2:
        with Locations((50.8, -88.2)):
            Circle(SKETCH8_R)
    cut_extrude4_tool2 = extrude(cut_extrude4_sk2.sketch, amount=-CUT_EXTRUDE4_REACH, mode=Mode.PRIVATE) & part.part
    add(cut_extrude4_tool2.solids().sort_by_distance((50.8, 0, 88.2))[0], mode=Mode.SUBTRACT)
    # Sketch8 → Cut-Extrude4 (cut, up to next)
    with BuildSketch(Plane(origin=(0, 0, 0), x_dir=(1, 0, 0), z_dir=(0, 1, 0)), mode=Mode.PRIVATE) as cut_extrude4_sk3:
        with Locations((50.8, -4.2)):
            Circle(SKETCH8_R)
    cut_extrude4_tool3 = extrude(cut_extrude4_sk3.sketch, amount=-CUT_EXTRUDE4_REACH, mode=Mode.PRIVATE) & part.part
    add(cut_extrude4_tool3.solids().sort_by_distance((50.8, 0, 4.2))[0], mode=Mode.SUBTRACT)
    # Sketch8 → Cut-Extrude4 (cut, up to next)
    with BuildSketch(Plane(origin=(0, 0, 0), x_dir=(1, 0, 0), z_dir=(0, 1, 0)), mode=Mode.PRIVATE) as cut_extrude4_sk4:
        with Locations((6.8, -4.2)):
            Circle(SKETCH8_R)
    cut_extrude4_tool4 = extrude(cut_extrude4_sk4.sketch, amount=-CUT_EXTRUDE4_REACH, mode=Mode.PRIVATE) & part.part
    add(cut_extrude4_tool4.solids().sort_by_distance((6.8, 0, 4.2))[0], mode=Mode.SUBTRACT)

    # Sketch10 → Boss-Extrude5 (add)
    with BuildSketch(Plane.XZ.offset(1.2)):
        Polygon((1.2, 93.8), (1.2, 1.2), (16.2, 1.2), (16.2, 2.4), (2.4, 2.4), (2.4, 92.6), (52.6, 92.6), (52.6, 2.4), (38.8, 2.4), (38.8, 1.2), (53.8, 1.2), (53.8, 93.8), align=None)
    extrude(amount=BOSS_EXTRUDE5_DEPTH)

    # Sketch11 → Boss-Extrude6 (add)
    with BuildSketch(Plane.XZ.offset(1.2)):
        with Locations((12.2, 9.275)):
            Circle(SKETCH11_R)
        with Locations((42.8, 9.275)):
            Circle(SKETCH11_R)
        with Locations((12.2, 39.775)):
            Circle(SKETCH11_R)
        with Locations((42.8, 39.775)):
            Circle(SKETCH11_R)
    extrude(amount=BOSS_EXTRUDE6_DEPTH)

    # Sketch12 → Cut-Extrude5 (cut)
    with BuildSketch(Plane(origin=(0, -11.2, 0), x_dir=(-1, 0, 0), z_dir=(0, -1, 0))):
        with Locations((-42.8, -39.775)):
            Circle(SKETCH12_R)
        with Locations((-12.2, -39.775)):
            Circle(SKETCH12_R)
        with Locations((-42.8, -9.275)):
            Circle(SKETCH12_R)
        with Locations((-12.2, -9.275)):
            Circle(SKETCH12_R)
    extrude(amount=-CUT_EXTRUDE5_DEPTH, mode=Mode.SUBTRACT)


solid = part.part
